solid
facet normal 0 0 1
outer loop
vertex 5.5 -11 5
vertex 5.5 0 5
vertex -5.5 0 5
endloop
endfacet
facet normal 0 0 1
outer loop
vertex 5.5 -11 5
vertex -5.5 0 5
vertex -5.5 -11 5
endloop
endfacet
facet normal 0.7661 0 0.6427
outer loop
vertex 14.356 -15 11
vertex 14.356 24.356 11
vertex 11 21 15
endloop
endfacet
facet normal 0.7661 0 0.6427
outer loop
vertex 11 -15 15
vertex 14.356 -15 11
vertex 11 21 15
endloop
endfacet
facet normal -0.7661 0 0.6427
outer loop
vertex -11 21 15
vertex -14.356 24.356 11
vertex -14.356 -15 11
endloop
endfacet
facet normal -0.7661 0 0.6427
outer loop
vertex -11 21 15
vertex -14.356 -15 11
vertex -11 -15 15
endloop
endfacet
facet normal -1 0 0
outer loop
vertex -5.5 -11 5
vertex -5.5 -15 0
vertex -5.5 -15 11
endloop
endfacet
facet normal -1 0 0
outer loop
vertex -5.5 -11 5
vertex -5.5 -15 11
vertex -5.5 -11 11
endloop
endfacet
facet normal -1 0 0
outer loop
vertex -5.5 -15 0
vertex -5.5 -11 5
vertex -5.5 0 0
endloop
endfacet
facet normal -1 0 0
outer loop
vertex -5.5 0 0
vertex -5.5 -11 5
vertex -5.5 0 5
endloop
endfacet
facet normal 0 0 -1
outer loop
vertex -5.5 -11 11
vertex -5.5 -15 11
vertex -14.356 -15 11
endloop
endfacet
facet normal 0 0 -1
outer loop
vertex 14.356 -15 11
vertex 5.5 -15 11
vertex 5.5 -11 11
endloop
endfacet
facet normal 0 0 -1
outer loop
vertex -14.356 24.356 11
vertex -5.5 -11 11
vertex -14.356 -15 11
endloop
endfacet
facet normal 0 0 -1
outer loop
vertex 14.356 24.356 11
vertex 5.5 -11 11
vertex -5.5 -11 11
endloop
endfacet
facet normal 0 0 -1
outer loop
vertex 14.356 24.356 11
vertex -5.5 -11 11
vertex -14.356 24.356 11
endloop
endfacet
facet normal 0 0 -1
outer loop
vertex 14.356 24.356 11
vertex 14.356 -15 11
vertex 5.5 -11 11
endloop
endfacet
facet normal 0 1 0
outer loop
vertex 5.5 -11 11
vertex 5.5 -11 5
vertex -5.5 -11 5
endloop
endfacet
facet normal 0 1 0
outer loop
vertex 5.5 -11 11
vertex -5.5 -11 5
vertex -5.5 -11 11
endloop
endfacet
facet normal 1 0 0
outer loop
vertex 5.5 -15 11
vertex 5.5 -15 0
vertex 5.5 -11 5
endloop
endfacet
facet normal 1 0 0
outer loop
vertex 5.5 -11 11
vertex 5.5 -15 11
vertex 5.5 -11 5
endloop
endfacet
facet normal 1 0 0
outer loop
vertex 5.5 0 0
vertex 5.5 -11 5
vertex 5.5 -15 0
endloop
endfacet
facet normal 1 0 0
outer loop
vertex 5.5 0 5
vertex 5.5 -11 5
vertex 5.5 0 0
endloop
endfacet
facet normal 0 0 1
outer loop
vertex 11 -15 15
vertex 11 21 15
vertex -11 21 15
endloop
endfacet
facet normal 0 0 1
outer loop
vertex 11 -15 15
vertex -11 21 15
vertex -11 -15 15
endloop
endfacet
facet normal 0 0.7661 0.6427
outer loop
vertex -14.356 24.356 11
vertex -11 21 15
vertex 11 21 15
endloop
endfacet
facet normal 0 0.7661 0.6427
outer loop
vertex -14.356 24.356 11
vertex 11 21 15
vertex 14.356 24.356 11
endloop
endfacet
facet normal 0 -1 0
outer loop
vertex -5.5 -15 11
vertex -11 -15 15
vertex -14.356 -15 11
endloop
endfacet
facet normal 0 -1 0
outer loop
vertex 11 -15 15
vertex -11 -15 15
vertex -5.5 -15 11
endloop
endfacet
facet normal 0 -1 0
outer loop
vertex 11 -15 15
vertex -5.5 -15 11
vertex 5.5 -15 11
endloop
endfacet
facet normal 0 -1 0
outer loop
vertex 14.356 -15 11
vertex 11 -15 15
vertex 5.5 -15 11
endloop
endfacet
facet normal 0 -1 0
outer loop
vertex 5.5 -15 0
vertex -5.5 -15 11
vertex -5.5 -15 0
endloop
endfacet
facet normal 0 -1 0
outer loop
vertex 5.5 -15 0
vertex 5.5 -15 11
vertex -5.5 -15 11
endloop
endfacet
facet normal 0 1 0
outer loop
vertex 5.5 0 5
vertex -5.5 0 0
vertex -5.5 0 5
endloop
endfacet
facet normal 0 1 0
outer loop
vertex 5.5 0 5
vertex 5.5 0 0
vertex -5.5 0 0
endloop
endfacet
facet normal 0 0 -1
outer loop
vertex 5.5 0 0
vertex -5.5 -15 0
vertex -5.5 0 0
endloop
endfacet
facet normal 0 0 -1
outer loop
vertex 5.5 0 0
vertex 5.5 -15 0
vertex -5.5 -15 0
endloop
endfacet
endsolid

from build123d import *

# Parameters (mm, degrees)
F1_DEPTH    = 5.5
F2_DEPTH    = 15
F3_T1_DEPTH = 64.5730638659
F3_T3_DEPTH = 54.5730638659


# Not quite as in the source:
# - a fillet or chamfer that OpenCascade refuses, or shapes differently, is made with other operations: its cross-section is extruded or revolved along the edge and cut away or added


with BuildPart() as f1:
    # F0 (on Right) → F1 (new body, symmetric)
    with BuildSketch(Plane.YZ):
        Polygon((-11, 0), (0, 0), (0, 5), (-11, 5), (-11, 11), (-15, 11), (-15, 0), align=None)
    extrude(amount=F1_DEPTH, both=True)

    # F0 (on Right) → F2 (join, symmetric)
    with BuildSketch(Plane.YZ):
        Polygon((-15, 15), (-15, 11), (-11, 11), (25, 11), (25, 15), align=None)
    extrude(amount=F2_DEPTH, both=True)

    # F3: chamfer of 4 x 4.7670143704 on 3 edges, made by hand

    # F3_s2 → F3_t1 (cut)
    with BuildSketch(Plane.XZ.offset(-37.2865319329)):
        Polygon((15, 10.2329856296), (11, 15), (15, 15), align=None)
        Polygon((-15, 10.2329856296), (-11, 15), (-15, 15), align=None)
    extrude(amount=F3_T1_DEPTH, mode=Mode.SUBTRACT)

    # F3_s4 → F3_t3 (cut)
    with BuildSketch(Plane.YZ.offset(-27.2865319329)):
        Polygon((21, 15), (25, 10.2329856296), (25, 15), align=None)
    extrude(amount=F3_T3_DEPTH, mode=Mode.SUBTRACT)


solid = f1.part
